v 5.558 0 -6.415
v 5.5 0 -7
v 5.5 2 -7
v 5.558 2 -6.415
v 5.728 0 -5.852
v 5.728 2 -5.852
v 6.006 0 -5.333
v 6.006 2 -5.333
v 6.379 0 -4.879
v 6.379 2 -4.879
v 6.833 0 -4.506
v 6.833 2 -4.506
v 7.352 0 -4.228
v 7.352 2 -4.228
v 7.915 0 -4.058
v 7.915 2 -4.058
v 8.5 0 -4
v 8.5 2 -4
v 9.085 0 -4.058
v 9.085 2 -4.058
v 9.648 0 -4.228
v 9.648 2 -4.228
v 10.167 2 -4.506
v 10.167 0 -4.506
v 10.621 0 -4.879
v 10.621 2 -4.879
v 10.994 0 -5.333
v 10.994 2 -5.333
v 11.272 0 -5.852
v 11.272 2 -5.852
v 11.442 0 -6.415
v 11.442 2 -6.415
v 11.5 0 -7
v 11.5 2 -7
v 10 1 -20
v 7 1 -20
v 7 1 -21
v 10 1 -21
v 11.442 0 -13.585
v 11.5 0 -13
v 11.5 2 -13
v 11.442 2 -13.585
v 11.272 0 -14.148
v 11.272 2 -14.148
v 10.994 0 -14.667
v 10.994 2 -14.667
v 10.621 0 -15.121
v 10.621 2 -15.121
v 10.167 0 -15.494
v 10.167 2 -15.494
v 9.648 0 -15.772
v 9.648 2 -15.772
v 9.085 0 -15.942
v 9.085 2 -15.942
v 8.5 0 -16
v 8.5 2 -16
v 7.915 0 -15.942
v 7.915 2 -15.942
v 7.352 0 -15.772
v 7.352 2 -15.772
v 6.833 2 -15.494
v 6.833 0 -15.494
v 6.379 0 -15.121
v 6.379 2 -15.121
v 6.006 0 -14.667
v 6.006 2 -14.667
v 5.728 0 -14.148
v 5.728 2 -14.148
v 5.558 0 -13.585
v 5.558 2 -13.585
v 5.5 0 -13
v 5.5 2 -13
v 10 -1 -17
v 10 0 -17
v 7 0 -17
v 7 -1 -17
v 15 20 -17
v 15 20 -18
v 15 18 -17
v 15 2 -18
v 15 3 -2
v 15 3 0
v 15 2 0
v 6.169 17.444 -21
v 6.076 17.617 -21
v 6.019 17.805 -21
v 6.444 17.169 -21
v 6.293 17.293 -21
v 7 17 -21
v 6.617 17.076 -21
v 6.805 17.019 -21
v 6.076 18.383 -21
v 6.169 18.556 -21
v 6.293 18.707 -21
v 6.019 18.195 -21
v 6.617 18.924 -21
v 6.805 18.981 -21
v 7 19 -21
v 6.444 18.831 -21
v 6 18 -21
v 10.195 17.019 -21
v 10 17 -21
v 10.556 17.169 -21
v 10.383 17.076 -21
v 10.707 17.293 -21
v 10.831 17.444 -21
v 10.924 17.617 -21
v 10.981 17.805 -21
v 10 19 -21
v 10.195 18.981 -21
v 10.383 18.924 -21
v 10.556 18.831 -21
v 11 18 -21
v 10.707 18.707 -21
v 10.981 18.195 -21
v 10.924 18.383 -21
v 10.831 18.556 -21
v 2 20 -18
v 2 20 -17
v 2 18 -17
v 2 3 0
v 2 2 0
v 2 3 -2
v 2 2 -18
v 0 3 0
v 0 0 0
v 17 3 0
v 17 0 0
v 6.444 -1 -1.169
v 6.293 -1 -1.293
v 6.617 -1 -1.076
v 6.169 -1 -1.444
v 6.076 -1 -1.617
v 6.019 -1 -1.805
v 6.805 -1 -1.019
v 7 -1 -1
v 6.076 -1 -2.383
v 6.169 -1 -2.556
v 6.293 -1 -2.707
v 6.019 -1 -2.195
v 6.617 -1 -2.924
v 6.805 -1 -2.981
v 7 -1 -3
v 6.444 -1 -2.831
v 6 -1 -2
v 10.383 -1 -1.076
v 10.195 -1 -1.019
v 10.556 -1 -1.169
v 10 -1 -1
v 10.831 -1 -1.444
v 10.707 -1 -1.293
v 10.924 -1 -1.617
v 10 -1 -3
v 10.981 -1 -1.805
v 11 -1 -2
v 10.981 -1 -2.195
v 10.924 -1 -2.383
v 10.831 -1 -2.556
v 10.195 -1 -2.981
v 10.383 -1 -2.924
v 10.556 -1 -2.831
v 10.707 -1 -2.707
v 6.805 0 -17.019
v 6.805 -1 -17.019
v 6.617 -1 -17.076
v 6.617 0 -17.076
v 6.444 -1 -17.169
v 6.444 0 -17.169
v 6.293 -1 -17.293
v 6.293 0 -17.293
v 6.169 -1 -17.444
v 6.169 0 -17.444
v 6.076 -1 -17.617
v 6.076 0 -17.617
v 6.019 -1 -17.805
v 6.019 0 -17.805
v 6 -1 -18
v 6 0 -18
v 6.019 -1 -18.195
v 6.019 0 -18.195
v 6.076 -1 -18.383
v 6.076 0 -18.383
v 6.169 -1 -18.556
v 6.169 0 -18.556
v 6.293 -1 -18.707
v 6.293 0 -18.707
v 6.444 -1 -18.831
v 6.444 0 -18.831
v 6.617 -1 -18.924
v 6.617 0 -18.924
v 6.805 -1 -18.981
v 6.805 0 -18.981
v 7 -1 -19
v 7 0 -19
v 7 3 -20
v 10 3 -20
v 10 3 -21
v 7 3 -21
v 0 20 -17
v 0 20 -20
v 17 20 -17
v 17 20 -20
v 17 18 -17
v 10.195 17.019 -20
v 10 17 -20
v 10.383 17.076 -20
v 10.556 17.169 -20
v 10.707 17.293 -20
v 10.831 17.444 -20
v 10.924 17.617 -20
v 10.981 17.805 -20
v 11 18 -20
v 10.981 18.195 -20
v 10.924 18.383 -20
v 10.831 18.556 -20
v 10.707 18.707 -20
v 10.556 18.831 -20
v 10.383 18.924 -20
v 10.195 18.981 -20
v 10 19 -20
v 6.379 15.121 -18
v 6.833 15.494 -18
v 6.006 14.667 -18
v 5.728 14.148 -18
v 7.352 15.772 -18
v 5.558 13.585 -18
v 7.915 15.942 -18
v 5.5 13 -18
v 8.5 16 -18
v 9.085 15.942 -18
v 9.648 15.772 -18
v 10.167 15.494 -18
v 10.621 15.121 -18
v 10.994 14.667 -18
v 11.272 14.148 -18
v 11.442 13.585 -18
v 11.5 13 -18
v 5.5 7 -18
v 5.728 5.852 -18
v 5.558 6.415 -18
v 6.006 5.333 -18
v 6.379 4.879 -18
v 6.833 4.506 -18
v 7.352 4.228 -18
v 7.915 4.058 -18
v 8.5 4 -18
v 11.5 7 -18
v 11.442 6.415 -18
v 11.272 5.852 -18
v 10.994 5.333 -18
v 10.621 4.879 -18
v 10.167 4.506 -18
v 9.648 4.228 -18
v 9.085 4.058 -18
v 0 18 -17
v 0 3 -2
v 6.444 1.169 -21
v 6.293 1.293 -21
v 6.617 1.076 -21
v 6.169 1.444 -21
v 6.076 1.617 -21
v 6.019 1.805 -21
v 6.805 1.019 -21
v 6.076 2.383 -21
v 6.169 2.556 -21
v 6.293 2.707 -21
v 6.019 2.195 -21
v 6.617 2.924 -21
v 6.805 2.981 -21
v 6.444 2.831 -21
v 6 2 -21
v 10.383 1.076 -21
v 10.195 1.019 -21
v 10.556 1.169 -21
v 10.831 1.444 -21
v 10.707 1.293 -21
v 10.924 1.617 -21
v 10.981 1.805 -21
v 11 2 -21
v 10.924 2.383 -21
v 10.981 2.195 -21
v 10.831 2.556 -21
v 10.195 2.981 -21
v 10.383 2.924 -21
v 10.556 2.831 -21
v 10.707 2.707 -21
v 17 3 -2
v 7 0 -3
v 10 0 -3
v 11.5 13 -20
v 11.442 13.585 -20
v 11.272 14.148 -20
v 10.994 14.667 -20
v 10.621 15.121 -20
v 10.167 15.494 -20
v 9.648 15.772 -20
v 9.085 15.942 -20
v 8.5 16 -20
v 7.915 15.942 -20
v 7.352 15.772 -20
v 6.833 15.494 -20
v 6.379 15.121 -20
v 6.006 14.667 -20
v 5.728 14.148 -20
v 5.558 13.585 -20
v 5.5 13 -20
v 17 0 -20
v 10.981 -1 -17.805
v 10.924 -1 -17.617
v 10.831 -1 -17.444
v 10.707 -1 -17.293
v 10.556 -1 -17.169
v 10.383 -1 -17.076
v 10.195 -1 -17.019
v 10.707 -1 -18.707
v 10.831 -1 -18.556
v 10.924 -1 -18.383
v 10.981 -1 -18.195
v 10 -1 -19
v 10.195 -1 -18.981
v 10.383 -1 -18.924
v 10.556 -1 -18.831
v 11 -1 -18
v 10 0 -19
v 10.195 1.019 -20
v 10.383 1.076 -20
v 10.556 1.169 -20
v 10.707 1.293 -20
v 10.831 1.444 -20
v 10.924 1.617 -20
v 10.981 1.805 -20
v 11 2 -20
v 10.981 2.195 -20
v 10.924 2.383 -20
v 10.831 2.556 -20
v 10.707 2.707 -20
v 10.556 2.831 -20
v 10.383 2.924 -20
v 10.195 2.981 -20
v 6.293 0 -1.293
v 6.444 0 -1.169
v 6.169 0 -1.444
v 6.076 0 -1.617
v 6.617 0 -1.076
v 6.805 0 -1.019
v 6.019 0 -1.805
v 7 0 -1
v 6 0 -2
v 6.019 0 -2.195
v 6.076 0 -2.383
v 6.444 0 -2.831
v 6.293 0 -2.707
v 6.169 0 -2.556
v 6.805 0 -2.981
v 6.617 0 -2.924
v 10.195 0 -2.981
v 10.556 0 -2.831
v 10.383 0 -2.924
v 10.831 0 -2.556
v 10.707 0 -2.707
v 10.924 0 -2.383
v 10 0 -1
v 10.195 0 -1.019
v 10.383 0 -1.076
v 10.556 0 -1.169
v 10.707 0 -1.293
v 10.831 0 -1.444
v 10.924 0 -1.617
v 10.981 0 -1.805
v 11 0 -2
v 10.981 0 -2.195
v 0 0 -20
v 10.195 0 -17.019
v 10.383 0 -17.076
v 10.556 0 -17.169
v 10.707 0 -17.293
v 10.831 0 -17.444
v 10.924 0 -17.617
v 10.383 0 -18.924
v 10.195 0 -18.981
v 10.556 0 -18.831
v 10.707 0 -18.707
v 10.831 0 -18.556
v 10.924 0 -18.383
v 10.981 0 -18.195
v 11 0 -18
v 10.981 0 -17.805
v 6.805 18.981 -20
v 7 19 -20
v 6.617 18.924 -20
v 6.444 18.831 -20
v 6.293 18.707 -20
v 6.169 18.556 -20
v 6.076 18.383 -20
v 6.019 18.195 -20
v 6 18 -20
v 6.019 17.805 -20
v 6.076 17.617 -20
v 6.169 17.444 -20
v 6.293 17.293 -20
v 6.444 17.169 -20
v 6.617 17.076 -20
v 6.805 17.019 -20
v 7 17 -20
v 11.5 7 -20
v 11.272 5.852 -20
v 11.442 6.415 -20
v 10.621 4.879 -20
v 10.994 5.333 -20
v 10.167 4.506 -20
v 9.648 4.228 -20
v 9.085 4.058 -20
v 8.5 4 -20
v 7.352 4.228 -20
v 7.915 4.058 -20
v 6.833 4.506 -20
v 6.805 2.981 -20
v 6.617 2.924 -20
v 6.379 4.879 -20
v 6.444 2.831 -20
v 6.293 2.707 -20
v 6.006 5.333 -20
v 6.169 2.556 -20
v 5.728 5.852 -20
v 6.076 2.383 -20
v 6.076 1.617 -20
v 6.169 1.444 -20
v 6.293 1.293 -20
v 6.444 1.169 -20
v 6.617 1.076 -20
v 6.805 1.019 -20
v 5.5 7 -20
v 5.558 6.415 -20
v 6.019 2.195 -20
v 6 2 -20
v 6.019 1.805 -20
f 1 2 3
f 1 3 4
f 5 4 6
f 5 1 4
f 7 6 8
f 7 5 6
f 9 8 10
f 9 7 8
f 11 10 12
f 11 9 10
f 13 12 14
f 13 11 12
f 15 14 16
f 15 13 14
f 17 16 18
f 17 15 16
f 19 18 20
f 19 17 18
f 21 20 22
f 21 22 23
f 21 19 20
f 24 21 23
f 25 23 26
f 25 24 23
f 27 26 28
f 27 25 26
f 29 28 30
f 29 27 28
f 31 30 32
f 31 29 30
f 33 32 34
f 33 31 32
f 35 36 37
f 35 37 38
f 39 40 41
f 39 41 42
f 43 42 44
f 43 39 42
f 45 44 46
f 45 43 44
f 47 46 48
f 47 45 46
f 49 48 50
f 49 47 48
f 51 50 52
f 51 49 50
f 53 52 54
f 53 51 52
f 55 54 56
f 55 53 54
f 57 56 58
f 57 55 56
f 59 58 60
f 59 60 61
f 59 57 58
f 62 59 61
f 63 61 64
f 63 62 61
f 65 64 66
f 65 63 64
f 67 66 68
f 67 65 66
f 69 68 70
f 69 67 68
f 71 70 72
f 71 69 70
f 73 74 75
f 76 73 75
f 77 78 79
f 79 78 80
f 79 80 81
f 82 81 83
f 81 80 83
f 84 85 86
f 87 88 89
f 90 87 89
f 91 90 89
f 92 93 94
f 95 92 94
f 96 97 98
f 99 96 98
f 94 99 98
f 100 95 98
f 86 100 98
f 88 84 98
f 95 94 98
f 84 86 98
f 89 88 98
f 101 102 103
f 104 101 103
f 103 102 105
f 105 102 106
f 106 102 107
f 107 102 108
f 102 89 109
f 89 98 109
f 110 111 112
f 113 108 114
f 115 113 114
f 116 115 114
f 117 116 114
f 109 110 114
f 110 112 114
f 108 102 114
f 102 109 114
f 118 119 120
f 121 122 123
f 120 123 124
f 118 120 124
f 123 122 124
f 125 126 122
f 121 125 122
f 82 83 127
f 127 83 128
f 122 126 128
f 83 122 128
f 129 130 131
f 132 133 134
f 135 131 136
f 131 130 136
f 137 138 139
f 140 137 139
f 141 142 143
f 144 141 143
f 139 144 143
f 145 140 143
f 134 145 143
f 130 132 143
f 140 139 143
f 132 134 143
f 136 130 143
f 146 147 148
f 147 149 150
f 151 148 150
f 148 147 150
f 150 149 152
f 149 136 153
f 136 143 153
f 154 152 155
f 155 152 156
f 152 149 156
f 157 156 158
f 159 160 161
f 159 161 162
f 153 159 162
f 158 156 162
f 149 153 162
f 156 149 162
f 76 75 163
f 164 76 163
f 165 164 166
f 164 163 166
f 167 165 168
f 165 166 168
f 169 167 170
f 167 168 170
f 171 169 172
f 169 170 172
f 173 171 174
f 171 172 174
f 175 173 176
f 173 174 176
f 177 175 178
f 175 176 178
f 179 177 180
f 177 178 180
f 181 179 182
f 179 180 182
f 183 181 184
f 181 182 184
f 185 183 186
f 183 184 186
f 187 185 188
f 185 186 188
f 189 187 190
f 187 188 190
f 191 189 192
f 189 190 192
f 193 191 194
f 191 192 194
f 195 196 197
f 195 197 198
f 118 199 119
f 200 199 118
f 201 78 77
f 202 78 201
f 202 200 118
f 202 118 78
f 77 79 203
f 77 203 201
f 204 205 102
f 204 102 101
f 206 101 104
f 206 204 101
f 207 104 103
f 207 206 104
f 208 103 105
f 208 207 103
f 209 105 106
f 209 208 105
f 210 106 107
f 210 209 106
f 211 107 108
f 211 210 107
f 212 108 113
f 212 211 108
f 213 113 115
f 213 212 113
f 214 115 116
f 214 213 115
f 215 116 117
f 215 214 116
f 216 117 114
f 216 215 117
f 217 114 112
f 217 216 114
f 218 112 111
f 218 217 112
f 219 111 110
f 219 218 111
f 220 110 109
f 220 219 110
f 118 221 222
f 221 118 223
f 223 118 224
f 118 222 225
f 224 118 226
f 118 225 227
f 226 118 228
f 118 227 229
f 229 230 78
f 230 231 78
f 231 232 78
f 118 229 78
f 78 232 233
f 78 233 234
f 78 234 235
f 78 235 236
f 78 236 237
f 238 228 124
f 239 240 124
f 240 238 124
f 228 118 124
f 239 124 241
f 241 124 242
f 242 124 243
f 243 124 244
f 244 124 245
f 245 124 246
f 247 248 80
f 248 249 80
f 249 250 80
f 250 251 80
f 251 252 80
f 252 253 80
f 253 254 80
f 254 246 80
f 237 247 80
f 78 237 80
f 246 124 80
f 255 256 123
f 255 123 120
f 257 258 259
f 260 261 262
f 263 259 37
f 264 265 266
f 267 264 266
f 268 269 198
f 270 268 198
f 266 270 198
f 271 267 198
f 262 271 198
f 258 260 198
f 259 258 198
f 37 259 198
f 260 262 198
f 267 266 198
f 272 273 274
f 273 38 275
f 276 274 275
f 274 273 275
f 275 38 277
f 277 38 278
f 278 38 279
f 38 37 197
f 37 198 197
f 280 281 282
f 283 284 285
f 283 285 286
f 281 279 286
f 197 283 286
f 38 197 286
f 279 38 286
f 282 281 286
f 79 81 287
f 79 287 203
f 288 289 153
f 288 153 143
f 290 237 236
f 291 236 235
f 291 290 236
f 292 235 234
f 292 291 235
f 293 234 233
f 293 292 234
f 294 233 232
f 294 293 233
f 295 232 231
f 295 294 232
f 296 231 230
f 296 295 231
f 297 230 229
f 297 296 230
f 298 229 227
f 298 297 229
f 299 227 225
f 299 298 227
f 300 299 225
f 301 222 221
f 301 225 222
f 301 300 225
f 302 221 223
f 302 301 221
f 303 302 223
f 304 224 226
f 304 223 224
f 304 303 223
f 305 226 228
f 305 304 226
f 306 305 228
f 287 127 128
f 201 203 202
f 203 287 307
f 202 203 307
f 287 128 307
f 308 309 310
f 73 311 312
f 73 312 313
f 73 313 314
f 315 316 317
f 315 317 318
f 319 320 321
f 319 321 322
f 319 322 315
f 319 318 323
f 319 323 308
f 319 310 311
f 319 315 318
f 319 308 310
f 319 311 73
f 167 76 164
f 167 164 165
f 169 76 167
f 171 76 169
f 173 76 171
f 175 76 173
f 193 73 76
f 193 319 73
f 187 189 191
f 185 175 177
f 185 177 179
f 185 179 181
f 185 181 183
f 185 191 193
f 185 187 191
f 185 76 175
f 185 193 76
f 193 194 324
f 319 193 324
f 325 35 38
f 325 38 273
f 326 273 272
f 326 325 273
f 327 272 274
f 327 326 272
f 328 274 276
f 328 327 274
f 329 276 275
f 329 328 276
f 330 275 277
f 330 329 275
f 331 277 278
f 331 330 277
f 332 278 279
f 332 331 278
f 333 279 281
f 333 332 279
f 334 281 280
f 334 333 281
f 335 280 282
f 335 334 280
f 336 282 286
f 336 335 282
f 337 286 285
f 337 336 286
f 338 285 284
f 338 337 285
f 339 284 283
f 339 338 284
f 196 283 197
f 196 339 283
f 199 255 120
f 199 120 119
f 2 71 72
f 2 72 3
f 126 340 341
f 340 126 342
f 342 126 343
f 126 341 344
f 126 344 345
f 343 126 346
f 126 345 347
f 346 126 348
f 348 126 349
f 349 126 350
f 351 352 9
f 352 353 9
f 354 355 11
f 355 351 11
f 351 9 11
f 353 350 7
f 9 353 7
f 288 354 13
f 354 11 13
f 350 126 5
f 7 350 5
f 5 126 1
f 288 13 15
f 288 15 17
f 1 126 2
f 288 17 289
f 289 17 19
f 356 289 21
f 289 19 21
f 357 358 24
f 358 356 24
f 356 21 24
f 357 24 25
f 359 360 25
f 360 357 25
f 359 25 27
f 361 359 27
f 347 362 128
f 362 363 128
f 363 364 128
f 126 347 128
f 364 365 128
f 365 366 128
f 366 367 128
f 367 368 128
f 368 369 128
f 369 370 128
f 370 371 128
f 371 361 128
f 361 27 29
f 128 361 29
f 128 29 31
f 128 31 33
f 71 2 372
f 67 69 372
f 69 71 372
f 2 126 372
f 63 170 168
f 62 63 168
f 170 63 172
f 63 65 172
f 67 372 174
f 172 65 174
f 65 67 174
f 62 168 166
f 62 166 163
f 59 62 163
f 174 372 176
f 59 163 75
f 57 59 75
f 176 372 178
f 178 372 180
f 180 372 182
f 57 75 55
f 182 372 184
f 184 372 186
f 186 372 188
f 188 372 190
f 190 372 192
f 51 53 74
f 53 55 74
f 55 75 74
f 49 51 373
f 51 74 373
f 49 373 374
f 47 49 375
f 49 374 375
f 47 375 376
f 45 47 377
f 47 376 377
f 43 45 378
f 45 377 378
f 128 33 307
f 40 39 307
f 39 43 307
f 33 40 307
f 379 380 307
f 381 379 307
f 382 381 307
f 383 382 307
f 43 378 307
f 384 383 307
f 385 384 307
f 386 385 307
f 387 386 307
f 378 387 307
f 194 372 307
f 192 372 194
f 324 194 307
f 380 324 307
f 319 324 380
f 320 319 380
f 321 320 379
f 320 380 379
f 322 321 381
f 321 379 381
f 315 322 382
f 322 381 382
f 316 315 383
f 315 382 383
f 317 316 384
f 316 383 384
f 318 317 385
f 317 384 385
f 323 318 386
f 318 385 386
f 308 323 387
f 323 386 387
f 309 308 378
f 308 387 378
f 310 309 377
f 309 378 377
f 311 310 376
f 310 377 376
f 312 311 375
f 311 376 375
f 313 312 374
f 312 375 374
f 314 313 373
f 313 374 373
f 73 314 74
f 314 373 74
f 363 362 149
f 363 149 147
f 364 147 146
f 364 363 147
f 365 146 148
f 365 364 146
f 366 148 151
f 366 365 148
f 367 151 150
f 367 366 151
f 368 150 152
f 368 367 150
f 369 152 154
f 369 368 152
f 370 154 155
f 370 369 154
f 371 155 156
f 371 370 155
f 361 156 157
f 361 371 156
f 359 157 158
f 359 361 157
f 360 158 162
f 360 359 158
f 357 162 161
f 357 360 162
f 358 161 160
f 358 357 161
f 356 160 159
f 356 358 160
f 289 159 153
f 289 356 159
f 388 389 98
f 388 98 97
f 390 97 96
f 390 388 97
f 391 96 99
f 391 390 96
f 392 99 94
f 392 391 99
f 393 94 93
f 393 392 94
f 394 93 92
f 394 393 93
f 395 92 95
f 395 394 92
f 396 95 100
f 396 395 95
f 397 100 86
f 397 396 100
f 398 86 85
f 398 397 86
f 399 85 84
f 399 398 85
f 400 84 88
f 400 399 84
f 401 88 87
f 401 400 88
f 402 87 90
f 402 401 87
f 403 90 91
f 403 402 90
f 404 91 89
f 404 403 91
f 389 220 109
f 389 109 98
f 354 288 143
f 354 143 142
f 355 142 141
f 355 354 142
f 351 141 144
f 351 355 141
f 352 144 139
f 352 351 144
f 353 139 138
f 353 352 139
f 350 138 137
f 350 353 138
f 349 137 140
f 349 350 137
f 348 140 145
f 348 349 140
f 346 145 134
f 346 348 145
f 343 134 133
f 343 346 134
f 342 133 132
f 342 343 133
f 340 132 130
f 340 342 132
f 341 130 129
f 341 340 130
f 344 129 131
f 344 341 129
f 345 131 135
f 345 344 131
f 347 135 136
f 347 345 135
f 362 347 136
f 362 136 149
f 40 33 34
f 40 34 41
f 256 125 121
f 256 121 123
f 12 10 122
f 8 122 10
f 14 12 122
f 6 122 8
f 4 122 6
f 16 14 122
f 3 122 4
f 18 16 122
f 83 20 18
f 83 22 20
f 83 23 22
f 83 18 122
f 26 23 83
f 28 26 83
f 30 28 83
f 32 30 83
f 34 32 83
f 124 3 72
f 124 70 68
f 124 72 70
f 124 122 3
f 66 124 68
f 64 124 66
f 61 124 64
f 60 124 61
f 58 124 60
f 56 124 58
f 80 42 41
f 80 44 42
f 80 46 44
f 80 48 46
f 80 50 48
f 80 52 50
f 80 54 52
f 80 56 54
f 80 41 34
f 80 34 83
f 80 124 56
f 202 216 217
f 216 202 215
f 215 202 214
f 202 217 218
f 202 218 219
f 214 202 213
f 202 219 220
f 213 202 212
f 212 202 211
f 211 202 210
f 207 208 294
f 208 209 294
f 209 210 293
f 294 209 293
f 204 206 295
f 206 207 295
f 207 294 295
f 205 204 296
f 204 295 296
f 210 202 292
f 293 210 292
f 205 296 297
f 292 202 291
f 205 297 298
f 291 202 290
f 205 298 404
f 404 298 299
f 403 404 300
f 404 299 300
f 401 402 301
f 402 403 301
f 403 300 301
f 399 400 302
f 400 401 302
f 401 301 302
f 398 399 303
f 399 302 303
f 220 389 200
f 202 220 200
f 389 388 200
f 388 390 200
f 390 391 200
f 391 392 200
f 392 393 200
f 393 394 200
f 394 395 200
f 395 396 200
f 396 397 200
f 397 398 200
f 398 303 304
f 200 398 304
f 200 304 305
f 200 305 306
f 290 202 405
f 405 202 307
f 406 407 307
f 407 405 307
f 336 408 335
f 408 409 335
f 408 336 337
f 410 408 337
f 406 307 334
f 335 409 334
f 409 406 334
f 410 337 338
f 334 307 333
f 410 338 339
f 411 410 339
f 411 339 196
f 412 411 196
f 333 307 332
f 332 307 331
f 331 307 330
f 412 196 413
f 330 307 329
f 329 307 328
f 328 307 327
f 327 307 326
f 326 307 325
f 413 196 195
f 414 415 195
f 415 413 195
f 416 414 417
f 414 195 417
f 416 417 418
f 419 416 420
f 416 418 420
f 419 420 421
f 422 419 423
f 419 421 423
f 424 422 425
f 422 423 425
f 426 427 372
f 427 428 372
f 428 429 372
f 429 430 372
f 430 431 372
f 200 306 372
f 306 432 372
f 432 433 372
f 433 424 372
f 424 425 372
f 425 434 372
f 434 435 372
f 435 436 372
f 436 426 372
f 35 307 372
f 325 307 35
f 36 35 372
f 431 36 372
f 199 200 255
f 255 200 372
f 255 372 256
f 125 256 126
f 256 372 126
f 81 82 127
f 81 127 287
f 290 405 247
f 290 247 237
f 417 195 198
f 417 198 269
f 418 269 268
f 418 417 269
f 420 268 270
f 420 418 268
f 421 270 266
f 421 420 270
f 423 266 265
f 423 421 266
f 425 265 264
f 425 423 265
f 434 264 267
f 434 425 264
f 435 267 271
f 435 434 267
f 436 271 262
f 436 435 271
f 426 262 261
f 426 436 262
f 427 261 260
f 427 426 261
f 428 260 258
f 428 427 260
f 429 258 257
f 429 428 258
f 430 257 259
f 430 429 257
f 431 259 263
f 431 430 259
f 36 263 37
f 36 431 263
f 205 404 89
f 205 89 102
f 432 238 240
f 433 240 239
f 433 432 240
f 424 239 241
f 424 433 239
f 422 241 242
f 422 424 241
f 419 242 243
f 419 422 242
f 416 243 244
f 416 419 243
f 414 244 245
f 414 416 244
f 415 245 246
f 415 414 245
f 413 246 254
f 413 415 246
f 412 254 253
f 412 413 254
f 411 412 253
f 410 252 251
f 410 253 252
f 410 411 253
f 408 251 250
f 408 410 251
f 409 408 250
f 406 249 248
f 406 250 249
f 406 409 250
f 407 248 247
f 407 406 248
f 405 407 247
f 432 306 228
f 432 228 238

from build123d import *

# Parameters (mm, degrees)
BASE_DEPTH        = 2
SIDES_DEPTH       = 18
NUBS_BOTTOM_DEPTH = 1
NUBS_REAR_DEPTH   = 1
SIDE_CUT_REACH    = 35.615
REAR_SLOT_DEPTH   = 34


with BuildPart() as part:
    # Base Sketch → Base (new body)
    with BuildSketch(Plane(origin=(0, 0, 0), x_dir=(1, 0, 0), z_dir=(0, 1, 0))):
        Polygon((0, 0), (2, 0), (15, 0), (17, 0), (17, 20), (0, 20), align=None)
        with BuildLine():
            Line((5.5, 13), (5.5, 7))
            ThreePointArc((5.5, 7), (8.5, 4), (11.5, 7))
            Line((11.5, 7), (11.5, 13))
            ThreePointArc((11.5, 13), (8.5, 16), (5.5, 13))
        make_face(mode=Mode.SUBTRACT)
    extrude(amount=BASE_DEPTH)

    # MainUprightSketch → Sides (add)
    with BuildSketch(Plane(origin=(0, 2, 0), x_dir=(1, 0, 0), z_dir=(0, 1, 0))):
        Polygon((17, 0), (17, 20), (0, 20), (0, 0), (2, 0), (2, 18), (15, 18), (15, 0), align=None)
    extrude(amount=SIDES_DEPTH)

    # NubsSketch → Nubs-Bottom (add)
    with BuildSketch(Plane(origin=(0, 0, 0), x_dir=(1, 0, 0), z_dir=(0, 1, 0))):
        with BuildLine():
            Line((7, 19), (10, 19))
            ThreePointArc((10, 19), (11, 18), (10, 17))
            Line((10, 17), (7, 17))
            ThreePointArc((7, 17), (6, 18), (7, 19))
        make_face()
        with BuildLine():
            Line((7, 1), (10, 1))
            ThreePointArc((10, 1), (11, 2), (10, 3))
            Line((10, 3), (7, 3))
            ThreePointArc((7, 3), (6, 2), (7, 1))
        make_face()
    extrude(amount=-NUBS_BOTTOM_DEPTH)

    # RearNubsSketch → Nubs-Rear (add)
    with BuildSketch(Plane.XY.offset(-20)):
        with BuildLine():
            Line((10, 3), (7, 3))
            ThreePointArc((7, 3), (6, 2), (7, 1))
            Line((7, 1), (10, 1))
            ThreePointArc((10, 1), (11, 2), (10, 3))
        make_face()
        with BuildLine():
            Line((10, 19), (7, 19))
            ThreePointArc((7, 19), (6, 18), (7, 17))
            Line((7, 17), (10, 17))
            ThreePointArc((10, 17), (11, 18), (10, 19))
        make_face()
    extrude(amount=-NUBS_REAR_DEPTH)

    # Cutaway Sketch → Side Cut (cut, up to next)
    with BuildSketch(Plane(origin=(0, 0, 0), x_dir=(0, 0, -1), z_dir=(1, 0, 0)), mode=Mode.PRIVATE) as side_cut_sk1:
        Polygon((0, 3), (2, 3), (17, 18), (17, 20), (0, 20), align=None)
    side_cut_tool1 = extrude(side_cut_sk1.sketch, amount=SIDE_CUT_REACH, mode=Mode.PRIVATE) & part.part
    add(side_cut_tool1.solids().sort_by_distance((0, 13.730878, -6.269122))[0], mode=Mode.SUBTRACT)
    add(side_cut_tool1.solids().sort_by_distance((0, 13.730878, -6.269122))[1], mode=Mode.SUBTRACT)

    # RearSlotSketch → Rear Slot (cut, through all)
    with BuildSketch(Plane.XY.offset(-20)):
        with BuildLine():
            Line((5.5, 13), (5.5, 7))
            ThreePointArc((5.5, 7), (8.5, 4), (11.5, 7))
            Line((11.5, 7), (11.5, 13))
            ThreePointArc((11.5, 13), (8.5, 16), (5.5, 13))
        make_face()
    extrude(amount=REAR_SLOT_DEPTH, mode=Mode.SUBTRACT)


solid = part.part
